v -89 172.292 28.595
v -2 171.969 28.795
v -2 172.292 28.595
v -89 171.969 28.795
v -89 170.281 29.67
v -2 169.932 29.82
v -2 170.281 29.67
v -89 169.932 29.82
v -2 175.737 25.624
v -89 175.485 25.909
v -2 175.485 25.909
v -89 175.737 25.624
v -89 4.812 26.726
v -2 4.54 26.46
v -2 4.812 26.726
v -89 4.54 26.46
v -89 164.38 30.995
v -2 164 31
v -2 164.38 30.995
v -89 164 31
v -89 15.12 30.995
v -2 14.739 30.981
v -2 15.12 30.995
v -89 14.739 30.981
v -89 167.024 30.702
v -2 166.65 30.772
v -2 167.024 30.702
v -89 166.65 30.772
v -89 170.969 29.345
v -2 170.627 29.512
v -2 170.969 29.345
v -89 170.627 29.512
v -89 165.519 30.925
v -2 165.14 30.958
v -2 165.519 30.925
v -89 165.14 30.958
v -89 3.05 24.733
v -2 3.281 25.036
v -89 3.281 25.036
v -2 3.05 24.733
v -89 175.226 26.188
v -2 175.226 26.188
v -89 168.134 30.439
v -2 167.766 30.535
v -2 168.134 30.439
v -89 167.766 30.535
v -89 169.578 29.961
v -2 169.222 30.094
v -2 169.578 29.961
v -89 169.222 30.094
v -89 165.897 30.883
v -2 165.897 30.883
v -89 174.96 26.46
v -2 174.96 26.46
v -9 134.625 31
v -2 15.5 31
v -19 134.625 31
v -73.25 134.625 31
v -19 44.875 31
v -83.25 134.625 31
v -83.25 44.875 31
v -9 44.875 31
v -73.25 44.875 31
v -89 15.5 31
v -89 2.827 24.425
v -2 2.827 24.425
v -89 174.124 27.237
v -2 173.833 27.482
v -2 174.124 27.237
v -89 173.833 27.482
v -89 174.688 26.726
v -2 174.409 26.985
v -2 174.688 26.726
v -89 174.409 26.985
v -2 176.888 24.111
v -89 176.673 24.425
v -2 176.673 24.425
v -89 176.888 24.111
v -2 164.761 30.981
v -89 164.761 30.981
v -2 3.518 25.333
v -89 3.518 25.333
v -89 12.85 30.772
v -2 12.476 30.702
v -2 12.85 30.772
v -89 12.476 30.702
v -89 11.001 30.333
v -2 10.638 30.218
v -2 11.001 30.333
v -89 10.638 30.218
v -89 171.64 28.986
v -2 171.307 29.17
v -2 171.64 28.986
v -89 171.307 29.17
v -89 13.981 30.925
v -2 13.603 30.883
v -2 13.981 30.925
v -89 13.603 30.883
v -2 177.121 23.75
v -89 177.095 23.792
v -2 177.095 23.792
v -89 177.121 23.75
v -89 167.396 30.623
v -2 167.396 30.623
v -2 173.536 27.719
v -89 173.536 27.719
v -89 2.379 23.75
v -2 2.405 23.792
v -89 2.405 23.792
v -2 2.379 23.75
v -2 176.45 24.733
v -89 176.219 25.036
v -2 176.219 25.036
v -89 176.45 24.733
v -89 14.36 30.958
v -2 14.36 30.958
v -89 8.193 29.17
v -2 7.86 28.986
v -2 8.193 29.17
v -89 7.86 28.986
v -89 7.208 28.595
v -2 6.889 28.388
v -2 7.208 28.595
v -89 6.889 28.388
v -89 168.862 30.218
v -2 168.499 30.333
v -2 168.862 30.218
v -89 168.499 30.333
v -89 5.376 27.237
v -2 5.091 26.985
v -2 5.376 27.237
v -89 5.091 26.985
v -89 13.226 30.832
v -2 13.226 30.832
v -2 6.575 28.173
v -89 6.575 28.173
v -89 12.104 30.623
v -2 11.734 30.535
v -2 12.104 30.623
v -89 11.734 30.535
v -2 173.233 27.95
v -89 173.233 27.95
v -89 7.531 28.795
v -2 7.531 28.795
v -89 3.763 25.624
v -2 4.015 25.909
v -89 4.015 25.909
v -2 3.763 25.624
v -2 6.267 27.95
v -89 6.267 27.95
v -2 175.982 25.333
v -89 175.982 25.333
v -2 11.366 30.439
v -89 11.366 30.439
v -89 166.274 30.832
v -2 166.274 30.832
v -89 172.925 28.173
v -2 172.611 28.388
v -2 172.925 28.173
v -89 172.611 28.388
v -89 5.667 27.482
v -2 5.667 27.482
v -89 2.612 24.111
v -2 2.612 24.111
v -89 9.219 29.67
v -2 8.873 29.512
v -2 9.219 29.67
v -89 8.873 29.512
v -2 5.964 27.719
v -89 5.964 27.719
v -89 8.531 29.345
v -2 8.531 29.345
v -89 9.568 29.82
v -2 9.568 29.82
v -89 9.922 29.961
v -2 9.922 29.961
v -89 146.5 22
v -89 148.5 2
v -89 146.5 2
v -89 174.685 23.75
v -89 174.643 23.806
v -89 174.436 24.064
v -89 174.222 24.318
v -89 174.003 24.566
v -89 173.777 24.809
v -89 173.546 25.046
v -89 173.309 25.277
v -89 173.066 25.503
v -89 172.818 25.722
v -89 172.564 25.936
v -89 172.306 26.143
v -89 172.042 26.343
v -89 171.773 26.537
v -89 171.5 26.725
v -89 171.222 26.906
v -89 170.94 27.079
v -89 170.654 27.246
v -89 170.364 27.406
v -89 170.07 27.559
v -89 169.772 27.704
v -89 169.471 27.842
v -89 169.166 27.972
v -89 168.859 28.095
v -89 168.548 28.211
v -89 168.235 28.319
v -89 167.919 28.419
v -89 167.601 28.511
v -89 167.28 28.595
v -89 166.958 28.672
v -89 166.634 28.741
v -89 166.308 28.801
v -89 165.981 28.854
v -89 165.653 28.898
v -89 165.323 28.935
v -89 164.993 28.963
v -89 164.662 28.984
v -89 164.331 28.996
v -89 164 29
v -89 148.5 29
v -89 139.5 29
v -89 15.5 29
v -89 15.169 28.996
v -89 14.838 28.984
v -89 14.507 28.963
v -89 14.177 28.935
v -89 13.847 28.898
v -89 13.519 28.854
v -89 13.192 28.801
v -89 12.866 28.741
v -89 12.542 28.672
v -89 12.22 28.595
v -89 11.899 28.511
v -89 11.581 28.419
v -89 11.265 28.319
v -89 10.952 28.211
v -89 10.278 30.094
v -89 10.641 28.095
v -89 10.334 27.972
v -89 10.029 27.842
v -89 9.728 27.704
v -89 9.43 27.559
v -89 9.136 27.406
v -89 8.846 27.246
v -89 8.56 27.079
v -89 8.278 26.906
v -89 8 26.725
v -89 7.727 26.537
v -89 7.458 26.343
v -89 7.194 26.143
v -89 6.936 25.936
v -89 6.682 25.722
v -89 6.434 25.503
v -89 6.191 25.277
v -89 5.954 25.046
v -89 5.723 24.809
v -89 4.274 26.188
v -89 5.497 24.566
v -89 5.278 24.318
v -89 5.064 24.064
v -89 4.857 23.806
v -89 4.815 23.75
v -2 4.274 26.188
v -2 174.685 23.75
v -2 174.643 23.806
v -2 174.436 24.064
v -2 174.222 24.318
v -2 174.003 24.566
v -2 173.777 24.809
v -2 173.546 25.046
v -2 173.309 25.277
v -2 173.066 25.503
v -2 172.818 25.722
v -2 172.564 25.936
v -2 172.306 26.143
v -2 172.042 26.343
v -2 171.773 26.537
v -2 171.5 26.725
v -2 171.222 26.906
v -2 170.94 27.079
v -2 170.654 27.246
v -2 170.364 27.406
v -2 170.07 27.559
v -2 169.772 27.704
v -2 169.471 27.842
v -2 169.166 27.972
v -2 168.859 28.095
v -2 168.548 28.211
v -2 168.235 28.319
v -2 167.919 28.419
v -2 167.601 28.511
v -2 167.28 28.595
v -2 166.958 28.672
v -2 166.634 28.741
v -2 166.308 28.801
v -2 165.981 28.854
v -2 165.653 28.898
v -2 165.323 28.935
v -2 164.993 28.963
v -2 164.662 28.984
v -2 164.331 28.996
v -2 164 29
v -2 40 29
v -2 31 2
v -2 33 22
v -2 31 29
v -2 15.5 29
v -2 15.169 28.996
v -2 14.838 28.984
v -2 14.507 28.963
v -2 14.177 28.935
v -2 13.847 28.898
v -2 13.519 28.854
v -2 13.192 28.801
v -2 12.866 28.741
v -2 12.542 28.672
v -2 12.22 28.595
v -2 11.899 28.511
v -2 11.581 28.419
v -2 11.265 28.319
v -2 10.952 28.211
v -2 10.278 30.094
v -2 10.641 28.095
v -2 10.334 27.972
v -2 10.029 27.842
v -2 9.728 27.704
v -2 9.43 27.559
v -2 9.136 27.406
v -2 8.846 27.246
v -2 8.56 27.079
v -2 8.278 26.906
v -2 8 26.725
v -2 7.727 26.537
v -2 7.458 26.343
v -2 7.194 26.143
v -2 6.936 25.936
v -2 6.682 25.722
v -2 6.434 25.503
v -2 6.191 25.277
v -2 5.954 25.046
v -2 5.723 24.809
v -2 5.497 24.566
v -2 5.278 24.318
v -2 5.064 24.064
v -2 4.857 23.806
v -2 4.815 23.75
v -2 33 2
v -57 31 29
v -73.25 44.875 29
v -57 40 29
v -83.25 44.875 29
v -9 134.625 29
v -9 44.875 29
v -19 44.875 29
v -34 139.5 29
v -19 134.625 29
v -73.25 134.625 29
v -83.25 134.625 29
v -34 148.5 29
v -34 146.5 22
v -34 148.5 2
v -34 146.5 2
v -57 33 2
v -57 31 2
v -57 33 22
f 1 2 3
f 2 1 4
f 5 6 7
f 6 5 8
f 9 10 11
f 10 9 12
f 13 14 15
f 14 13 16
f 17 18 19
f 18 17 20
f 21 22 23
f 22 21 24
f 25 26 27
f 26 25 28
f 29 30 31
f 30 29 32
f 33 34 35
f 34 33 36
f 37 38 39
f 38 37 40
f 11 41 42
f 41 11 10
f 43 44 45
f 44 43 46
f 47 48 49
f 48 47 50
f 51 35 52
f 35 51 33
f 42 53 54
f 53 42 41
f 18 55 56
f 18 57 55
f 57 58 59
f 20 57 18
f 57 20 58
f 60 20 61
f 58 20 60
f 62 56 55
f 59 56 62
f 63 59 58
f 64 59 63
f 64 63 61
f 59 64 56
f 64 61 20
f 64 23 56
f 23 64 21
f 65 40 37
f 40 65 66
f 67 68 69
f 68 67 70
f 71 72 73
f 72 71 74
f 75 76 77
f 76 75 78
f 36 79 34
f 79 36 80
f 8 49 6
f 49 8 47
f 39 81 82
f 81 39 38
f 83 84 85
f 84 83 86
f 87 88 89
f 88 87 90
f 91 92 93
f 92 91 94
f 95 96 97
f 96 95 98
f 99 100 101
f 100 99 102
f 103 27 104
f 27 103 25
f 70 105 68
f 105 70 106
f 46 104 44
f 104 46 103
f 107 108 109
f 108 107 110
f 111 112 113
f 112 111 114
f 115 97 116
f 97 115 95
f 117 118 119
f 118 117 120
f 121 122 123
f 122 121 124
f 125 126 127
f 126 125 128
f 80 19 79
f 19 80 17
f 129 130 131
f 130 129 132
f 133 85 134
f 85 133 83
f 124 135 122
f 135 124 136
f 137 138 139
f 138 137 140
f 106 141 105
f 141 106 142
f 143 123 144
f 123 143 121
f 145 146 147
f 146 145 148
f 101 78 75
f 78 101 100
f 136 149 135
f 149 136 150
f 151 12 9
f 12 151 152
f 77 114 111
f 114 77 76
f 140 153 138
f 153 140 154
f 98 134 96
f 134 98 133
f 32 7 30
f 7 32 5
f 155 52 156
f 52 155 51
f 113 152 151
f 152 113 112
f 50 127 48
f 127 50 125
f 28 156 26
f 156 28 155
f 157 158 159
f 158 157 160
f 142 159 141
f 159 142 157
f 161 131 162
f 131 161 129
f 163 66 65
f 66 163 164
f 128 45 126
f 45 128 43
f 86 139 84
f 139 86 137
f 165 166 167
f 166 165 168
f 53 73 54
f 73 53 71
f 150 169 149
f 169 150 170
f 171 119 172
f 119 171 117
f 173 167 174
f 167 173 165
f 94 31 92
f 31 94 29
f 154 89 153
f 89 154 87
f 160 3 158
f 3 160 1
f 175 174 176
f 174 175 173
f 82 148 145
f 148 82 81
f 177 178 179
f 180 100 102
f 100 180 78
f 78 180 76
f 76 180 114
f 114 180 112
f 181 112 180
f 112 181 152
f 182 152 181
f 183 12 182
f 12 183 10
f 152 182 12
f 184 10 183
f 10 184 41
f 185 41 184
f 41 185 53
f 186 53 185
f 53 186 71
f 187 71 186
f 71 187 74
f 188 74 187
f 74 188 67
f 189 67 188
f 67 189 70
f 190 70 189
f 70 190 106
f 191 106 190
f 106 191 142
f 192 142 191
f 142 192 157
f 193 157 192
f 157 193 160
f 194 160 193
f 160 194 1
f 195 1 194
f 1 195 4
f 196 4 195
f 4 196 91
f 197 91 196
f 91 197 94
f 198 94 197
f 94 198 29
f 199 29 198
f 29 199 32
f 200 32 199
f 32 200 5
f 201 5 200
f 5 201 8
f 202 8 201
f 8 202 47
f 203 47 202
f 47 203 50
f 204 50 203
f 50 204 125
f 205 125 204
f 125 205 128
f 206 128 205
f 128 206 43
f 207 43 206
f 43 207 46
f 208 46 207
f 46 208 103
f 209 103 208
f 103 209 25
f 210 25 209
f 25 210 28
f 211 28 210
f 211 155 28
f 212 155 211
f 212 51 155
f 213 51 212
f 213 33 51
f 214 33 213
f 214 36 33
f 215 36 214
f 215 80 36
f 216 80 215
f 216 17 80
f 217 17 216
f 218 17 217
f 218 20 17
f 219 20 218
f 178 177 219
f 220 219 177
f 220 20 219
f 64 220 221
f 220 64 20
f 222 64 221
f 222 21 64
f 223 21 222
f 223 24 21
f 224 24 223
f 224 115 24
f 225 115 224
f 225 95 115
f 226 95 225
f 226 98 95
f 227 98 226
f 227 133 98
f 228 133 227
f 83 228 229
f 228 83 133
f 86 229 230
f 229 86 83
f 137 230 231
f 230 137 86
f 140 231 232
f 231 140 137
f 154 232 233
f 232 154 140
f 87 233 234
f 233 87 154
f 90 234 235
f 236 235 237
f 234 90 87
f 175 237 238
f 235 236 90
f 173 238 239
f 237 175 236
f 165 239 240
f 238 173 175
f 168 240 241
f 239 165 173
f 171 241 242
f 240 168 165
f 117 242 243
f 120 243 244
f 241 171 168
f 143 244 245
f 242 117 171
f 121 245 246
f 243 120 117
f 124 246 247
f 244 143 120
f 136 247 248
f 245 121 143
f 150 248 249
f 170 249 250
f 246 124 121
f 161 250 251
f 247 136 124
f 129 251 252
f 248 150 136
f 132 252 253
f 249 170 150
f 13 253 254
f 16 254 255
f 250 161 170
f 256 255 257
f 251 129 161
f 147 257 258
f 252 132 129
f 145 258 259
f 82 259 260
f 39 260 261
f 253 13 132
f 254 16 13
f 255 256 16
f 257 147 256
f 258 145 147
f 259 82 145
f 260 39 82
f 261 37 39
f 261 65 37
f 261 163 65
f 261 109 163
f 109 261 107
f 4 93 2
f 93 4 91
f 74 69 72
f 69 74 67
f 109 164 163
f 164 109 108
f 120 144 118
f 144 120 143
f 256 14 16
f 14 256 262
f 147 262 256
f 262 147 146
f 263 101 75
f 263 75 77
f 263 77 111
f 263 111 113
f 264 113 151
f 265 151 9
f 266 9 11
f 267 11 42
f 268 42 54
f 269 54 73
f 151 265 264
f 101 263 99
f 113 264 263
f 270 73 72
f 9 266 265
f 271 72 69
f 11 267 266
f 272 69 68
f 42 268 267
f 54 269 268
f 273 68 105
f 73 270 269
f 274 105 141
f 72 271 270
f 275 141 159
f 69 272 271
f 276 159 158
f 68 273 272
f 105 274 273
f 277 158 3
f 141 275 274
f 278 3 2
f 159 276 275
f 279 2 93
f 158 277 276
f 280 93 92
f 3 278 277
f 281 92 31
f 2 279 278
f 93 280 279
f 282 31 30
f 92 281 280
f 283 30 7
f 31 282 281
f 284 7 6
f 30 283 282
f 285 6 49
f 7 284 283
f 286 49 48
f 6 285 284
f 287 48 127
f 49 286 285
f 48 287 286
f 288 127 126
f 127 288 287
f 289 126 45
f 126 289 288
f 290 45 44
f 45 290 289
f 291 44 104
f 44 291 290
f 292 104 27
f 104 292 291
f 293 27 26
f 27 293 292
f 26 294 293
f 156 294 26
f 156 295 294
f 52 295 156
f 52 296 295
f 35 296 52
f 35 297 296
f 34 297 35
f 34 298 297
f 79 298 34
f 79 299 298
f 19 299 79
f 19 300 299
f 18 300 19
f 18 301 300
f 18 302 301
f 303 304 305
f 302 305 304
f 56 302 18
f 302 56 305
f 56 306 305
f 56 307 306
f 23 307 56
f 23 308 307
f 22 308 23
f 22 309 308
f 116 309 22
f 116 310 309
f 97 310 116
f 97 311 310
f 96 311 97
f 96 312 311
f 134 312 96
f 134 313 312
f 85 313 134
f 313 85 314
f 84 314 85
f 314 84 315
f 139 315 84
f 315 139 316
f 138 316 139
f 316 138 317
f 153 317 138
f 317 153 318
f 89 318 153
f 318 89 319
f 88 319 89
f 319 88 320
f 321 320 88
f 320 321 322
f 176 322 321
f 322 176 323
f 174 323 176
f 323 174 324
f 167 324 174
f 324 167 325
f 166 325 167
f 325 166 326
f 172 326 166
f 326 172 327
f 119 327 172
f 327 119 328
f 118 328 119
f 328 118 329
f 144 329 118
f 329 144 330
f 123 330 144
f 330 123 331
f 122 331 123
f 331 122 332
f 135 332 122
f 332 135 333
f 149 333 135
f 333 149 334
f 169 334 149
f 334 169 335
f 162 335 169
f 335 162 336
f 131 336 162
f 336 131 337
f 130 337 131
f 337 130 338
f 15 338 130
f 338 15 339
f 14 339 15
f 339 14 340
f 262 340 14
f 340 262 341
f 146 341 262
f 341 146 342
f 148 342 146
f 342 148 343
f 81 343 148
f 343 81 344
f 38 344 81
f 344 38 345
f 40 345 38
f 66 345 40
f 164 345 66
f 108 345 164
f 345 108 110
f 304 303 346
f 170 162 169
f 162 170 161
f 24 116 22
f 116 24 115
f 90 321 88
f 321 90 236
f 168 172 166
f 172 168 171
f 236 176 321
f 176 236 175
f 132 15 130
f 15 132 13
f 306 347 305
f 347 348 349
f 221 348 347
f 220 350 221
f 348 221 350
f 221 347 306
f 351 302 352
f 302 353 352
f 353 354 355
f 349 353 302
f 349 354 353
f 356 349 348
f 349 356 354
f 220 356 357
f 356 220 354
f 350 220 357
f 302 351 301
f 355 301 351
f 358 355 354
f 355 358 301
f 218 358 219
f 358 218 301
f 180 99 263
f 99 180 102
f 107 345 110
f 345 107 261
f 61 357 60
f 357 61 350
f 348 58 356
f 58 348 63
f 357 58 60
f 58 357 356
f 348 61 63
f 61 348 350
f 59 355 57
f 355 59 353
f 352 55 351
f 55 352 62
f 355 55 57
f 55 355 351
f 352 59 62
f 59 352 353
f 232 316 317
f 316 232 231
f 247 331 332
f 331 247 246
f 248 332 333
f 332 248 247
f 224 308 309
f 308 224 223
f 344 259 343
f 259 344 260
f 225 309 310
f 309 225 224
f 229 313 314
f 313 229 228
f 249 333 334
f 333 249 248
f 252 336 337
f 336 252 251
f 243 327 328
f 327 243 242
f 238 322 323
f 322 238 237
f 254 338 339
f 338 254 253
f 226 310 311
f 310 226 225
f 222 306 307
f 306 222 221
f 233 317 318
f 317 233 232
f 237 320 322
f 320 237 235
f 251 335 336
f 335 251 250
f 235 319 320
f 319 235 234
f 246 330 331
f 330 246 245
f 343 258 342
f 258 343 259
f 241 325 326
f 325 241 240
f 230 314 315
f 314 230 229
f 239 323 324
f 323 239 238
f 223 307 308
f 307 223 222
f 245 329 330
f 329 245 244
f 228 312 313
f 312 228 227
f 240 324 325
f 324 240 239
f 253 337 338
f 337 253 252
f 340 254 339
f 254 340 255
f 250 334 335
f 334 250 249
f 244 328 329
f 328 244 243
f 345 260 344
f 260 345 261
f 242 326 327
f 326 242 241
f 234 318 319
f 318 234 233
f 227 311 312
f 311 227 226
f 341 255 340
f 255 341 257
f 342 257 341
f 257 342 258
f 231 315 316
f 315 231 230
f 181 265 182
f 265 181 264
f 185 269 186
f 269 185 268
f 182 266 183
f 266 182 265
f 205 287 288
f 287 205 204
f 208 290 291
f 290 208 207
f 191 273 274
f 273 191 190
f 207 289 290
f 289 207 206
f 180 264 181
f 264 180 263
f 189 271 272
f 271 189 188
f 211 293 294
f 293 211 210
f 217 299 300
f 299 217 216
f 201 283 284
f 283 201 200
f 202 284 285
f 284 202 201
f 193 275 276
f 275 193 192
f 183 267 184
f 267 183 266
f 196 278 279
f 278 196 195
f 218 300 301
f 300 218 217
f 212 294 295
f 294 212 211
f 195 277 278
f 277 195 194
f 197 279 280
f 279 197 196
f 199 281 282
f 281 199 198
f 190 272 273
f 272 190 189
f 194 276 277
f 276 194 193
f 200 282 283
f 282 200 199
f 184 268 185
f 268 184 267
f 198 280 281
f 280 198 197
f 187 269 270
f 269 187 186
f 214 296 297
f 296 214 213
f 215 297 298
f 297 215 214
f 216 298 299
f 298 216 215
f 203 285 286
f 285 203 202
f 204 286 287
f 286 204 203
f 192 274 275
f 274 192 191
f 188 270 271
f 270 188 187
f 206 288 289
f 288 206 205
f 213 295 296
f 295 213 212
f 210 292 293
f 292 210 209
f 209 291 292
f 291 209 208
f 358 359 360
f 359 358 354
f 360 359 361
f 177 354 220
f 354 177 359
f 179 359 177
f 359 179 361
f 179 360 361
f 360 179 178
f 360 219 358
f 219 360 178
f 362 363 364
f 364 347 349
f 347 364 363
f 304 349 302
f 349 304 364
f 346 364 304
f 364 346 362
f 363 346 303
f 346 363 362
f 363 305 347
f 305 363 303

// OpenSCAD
$fn=256;

motor_rad = 13.5;
motor_dia = motor_rad * 2;
motor_len = 59;

arduino_len = 101.5;
arduino_wid = 53.3;

driver_len = 43;
driver_wid = 43;

base_ht = 2;
padding = 2;

axle_offset = motor_rad + padding;
x_offset = 32;

y_dim = arduino_len + (2 * motor_dia) + 24;
x_dim = motor_len + x_offset;
z_dim = motor_dia + base_ht;

module box(x, y, z) {
    hull()
    {
        translate([x, y - axle_offset, motor_rad + padding])
            rotate([0, -90, 0])
                cylinder(d=motor_dia + 4, h=x);
        translate([x, axle_offset, motor_rad + padding])
            rotate([0, -90, 0])
                cylinder(d=motor_dia + 4, h=x);  
    }
}

module top() {
    translate([padding, 0, 0])
    
    difference() {
        union() {
            difference()
            {
                box(x_dim - (2 * padding), y_dim, z_dim);

                translate([- padding - 1, axle_offset, 0])
                    cube([x_dim + padding, y_dim - motor_dia - padding * 2, z_dim]);
                
                translate([- padding - 1, 0, - 1])
                    cube([x_dim + padding, y_dim, 3 * (z_dim / 4) + 2 + 1]);

                
                width = 10;
                length = y_dim / 2;
                translate([3 * (x_dim / 4) + width / 2 - padding, y_dim / 2 - length / 2, z_dim - padding])
                    cube([width, length, z_dim / 2]);
                
                translate([padding + width / 2, y_dim / 2 - length / 2, z_dim - padding])
                    cube([width, length, z_dim / 2]);
            }


        }
        translate([- padding - 1, axle_offset, motor_rad + padding])
            rotate([0, 90, 0])
                cylinder(r=motor_rad, h=x_dim + padding);
        
        translate([- padding - 1, y_dim - axle_offset, motor_rad + padding])
            rotate([0, 90, 0])
                cylinder(r=motor_rad, h=x_dim + padding);
    }
    
    length = x_dim - padding - x_offset;
        
    top_brace();
    
    translate([x_dim, y_dim, 0])
        rotate([0, 0, 180])
            top_brace();   
}

module top_brace() {
    angle_size = 12;
    angle_x = x_offset + padding;
    angle_y = y_dim - motor_rad - axle_offset - angle_size / 2 + padding;
    angle_z = z_dim - padding - angle_size / 2;

    translate([x_offset + padding, y_dim - motor_rad - axle_offset - 4, padding])
        cube([x_dim - x_offset - (padding * 2), padding, z_dim - padding]);
    
    difference() {
        translate([angle_x, angle_y + padding / 2, angle_z])
           rotate([45, 0, 0])
                cube([x_dim - x_offset - (padding * 2), angle_size, angle_size]);
        
        translate([angle_x - 1, angle_y, angle_z])
            cube([x_dim - x_offset - padding, angle_size, angle_size * 2]);
        
        translate([angle_x - 1 , angle_y - angle_size + padding / 2, z_dim + padding / 2])
            cube([x_dim - x_offset - padding, angle_size, angle_size]);

    }
}



mirror([1,0,0])
top();
